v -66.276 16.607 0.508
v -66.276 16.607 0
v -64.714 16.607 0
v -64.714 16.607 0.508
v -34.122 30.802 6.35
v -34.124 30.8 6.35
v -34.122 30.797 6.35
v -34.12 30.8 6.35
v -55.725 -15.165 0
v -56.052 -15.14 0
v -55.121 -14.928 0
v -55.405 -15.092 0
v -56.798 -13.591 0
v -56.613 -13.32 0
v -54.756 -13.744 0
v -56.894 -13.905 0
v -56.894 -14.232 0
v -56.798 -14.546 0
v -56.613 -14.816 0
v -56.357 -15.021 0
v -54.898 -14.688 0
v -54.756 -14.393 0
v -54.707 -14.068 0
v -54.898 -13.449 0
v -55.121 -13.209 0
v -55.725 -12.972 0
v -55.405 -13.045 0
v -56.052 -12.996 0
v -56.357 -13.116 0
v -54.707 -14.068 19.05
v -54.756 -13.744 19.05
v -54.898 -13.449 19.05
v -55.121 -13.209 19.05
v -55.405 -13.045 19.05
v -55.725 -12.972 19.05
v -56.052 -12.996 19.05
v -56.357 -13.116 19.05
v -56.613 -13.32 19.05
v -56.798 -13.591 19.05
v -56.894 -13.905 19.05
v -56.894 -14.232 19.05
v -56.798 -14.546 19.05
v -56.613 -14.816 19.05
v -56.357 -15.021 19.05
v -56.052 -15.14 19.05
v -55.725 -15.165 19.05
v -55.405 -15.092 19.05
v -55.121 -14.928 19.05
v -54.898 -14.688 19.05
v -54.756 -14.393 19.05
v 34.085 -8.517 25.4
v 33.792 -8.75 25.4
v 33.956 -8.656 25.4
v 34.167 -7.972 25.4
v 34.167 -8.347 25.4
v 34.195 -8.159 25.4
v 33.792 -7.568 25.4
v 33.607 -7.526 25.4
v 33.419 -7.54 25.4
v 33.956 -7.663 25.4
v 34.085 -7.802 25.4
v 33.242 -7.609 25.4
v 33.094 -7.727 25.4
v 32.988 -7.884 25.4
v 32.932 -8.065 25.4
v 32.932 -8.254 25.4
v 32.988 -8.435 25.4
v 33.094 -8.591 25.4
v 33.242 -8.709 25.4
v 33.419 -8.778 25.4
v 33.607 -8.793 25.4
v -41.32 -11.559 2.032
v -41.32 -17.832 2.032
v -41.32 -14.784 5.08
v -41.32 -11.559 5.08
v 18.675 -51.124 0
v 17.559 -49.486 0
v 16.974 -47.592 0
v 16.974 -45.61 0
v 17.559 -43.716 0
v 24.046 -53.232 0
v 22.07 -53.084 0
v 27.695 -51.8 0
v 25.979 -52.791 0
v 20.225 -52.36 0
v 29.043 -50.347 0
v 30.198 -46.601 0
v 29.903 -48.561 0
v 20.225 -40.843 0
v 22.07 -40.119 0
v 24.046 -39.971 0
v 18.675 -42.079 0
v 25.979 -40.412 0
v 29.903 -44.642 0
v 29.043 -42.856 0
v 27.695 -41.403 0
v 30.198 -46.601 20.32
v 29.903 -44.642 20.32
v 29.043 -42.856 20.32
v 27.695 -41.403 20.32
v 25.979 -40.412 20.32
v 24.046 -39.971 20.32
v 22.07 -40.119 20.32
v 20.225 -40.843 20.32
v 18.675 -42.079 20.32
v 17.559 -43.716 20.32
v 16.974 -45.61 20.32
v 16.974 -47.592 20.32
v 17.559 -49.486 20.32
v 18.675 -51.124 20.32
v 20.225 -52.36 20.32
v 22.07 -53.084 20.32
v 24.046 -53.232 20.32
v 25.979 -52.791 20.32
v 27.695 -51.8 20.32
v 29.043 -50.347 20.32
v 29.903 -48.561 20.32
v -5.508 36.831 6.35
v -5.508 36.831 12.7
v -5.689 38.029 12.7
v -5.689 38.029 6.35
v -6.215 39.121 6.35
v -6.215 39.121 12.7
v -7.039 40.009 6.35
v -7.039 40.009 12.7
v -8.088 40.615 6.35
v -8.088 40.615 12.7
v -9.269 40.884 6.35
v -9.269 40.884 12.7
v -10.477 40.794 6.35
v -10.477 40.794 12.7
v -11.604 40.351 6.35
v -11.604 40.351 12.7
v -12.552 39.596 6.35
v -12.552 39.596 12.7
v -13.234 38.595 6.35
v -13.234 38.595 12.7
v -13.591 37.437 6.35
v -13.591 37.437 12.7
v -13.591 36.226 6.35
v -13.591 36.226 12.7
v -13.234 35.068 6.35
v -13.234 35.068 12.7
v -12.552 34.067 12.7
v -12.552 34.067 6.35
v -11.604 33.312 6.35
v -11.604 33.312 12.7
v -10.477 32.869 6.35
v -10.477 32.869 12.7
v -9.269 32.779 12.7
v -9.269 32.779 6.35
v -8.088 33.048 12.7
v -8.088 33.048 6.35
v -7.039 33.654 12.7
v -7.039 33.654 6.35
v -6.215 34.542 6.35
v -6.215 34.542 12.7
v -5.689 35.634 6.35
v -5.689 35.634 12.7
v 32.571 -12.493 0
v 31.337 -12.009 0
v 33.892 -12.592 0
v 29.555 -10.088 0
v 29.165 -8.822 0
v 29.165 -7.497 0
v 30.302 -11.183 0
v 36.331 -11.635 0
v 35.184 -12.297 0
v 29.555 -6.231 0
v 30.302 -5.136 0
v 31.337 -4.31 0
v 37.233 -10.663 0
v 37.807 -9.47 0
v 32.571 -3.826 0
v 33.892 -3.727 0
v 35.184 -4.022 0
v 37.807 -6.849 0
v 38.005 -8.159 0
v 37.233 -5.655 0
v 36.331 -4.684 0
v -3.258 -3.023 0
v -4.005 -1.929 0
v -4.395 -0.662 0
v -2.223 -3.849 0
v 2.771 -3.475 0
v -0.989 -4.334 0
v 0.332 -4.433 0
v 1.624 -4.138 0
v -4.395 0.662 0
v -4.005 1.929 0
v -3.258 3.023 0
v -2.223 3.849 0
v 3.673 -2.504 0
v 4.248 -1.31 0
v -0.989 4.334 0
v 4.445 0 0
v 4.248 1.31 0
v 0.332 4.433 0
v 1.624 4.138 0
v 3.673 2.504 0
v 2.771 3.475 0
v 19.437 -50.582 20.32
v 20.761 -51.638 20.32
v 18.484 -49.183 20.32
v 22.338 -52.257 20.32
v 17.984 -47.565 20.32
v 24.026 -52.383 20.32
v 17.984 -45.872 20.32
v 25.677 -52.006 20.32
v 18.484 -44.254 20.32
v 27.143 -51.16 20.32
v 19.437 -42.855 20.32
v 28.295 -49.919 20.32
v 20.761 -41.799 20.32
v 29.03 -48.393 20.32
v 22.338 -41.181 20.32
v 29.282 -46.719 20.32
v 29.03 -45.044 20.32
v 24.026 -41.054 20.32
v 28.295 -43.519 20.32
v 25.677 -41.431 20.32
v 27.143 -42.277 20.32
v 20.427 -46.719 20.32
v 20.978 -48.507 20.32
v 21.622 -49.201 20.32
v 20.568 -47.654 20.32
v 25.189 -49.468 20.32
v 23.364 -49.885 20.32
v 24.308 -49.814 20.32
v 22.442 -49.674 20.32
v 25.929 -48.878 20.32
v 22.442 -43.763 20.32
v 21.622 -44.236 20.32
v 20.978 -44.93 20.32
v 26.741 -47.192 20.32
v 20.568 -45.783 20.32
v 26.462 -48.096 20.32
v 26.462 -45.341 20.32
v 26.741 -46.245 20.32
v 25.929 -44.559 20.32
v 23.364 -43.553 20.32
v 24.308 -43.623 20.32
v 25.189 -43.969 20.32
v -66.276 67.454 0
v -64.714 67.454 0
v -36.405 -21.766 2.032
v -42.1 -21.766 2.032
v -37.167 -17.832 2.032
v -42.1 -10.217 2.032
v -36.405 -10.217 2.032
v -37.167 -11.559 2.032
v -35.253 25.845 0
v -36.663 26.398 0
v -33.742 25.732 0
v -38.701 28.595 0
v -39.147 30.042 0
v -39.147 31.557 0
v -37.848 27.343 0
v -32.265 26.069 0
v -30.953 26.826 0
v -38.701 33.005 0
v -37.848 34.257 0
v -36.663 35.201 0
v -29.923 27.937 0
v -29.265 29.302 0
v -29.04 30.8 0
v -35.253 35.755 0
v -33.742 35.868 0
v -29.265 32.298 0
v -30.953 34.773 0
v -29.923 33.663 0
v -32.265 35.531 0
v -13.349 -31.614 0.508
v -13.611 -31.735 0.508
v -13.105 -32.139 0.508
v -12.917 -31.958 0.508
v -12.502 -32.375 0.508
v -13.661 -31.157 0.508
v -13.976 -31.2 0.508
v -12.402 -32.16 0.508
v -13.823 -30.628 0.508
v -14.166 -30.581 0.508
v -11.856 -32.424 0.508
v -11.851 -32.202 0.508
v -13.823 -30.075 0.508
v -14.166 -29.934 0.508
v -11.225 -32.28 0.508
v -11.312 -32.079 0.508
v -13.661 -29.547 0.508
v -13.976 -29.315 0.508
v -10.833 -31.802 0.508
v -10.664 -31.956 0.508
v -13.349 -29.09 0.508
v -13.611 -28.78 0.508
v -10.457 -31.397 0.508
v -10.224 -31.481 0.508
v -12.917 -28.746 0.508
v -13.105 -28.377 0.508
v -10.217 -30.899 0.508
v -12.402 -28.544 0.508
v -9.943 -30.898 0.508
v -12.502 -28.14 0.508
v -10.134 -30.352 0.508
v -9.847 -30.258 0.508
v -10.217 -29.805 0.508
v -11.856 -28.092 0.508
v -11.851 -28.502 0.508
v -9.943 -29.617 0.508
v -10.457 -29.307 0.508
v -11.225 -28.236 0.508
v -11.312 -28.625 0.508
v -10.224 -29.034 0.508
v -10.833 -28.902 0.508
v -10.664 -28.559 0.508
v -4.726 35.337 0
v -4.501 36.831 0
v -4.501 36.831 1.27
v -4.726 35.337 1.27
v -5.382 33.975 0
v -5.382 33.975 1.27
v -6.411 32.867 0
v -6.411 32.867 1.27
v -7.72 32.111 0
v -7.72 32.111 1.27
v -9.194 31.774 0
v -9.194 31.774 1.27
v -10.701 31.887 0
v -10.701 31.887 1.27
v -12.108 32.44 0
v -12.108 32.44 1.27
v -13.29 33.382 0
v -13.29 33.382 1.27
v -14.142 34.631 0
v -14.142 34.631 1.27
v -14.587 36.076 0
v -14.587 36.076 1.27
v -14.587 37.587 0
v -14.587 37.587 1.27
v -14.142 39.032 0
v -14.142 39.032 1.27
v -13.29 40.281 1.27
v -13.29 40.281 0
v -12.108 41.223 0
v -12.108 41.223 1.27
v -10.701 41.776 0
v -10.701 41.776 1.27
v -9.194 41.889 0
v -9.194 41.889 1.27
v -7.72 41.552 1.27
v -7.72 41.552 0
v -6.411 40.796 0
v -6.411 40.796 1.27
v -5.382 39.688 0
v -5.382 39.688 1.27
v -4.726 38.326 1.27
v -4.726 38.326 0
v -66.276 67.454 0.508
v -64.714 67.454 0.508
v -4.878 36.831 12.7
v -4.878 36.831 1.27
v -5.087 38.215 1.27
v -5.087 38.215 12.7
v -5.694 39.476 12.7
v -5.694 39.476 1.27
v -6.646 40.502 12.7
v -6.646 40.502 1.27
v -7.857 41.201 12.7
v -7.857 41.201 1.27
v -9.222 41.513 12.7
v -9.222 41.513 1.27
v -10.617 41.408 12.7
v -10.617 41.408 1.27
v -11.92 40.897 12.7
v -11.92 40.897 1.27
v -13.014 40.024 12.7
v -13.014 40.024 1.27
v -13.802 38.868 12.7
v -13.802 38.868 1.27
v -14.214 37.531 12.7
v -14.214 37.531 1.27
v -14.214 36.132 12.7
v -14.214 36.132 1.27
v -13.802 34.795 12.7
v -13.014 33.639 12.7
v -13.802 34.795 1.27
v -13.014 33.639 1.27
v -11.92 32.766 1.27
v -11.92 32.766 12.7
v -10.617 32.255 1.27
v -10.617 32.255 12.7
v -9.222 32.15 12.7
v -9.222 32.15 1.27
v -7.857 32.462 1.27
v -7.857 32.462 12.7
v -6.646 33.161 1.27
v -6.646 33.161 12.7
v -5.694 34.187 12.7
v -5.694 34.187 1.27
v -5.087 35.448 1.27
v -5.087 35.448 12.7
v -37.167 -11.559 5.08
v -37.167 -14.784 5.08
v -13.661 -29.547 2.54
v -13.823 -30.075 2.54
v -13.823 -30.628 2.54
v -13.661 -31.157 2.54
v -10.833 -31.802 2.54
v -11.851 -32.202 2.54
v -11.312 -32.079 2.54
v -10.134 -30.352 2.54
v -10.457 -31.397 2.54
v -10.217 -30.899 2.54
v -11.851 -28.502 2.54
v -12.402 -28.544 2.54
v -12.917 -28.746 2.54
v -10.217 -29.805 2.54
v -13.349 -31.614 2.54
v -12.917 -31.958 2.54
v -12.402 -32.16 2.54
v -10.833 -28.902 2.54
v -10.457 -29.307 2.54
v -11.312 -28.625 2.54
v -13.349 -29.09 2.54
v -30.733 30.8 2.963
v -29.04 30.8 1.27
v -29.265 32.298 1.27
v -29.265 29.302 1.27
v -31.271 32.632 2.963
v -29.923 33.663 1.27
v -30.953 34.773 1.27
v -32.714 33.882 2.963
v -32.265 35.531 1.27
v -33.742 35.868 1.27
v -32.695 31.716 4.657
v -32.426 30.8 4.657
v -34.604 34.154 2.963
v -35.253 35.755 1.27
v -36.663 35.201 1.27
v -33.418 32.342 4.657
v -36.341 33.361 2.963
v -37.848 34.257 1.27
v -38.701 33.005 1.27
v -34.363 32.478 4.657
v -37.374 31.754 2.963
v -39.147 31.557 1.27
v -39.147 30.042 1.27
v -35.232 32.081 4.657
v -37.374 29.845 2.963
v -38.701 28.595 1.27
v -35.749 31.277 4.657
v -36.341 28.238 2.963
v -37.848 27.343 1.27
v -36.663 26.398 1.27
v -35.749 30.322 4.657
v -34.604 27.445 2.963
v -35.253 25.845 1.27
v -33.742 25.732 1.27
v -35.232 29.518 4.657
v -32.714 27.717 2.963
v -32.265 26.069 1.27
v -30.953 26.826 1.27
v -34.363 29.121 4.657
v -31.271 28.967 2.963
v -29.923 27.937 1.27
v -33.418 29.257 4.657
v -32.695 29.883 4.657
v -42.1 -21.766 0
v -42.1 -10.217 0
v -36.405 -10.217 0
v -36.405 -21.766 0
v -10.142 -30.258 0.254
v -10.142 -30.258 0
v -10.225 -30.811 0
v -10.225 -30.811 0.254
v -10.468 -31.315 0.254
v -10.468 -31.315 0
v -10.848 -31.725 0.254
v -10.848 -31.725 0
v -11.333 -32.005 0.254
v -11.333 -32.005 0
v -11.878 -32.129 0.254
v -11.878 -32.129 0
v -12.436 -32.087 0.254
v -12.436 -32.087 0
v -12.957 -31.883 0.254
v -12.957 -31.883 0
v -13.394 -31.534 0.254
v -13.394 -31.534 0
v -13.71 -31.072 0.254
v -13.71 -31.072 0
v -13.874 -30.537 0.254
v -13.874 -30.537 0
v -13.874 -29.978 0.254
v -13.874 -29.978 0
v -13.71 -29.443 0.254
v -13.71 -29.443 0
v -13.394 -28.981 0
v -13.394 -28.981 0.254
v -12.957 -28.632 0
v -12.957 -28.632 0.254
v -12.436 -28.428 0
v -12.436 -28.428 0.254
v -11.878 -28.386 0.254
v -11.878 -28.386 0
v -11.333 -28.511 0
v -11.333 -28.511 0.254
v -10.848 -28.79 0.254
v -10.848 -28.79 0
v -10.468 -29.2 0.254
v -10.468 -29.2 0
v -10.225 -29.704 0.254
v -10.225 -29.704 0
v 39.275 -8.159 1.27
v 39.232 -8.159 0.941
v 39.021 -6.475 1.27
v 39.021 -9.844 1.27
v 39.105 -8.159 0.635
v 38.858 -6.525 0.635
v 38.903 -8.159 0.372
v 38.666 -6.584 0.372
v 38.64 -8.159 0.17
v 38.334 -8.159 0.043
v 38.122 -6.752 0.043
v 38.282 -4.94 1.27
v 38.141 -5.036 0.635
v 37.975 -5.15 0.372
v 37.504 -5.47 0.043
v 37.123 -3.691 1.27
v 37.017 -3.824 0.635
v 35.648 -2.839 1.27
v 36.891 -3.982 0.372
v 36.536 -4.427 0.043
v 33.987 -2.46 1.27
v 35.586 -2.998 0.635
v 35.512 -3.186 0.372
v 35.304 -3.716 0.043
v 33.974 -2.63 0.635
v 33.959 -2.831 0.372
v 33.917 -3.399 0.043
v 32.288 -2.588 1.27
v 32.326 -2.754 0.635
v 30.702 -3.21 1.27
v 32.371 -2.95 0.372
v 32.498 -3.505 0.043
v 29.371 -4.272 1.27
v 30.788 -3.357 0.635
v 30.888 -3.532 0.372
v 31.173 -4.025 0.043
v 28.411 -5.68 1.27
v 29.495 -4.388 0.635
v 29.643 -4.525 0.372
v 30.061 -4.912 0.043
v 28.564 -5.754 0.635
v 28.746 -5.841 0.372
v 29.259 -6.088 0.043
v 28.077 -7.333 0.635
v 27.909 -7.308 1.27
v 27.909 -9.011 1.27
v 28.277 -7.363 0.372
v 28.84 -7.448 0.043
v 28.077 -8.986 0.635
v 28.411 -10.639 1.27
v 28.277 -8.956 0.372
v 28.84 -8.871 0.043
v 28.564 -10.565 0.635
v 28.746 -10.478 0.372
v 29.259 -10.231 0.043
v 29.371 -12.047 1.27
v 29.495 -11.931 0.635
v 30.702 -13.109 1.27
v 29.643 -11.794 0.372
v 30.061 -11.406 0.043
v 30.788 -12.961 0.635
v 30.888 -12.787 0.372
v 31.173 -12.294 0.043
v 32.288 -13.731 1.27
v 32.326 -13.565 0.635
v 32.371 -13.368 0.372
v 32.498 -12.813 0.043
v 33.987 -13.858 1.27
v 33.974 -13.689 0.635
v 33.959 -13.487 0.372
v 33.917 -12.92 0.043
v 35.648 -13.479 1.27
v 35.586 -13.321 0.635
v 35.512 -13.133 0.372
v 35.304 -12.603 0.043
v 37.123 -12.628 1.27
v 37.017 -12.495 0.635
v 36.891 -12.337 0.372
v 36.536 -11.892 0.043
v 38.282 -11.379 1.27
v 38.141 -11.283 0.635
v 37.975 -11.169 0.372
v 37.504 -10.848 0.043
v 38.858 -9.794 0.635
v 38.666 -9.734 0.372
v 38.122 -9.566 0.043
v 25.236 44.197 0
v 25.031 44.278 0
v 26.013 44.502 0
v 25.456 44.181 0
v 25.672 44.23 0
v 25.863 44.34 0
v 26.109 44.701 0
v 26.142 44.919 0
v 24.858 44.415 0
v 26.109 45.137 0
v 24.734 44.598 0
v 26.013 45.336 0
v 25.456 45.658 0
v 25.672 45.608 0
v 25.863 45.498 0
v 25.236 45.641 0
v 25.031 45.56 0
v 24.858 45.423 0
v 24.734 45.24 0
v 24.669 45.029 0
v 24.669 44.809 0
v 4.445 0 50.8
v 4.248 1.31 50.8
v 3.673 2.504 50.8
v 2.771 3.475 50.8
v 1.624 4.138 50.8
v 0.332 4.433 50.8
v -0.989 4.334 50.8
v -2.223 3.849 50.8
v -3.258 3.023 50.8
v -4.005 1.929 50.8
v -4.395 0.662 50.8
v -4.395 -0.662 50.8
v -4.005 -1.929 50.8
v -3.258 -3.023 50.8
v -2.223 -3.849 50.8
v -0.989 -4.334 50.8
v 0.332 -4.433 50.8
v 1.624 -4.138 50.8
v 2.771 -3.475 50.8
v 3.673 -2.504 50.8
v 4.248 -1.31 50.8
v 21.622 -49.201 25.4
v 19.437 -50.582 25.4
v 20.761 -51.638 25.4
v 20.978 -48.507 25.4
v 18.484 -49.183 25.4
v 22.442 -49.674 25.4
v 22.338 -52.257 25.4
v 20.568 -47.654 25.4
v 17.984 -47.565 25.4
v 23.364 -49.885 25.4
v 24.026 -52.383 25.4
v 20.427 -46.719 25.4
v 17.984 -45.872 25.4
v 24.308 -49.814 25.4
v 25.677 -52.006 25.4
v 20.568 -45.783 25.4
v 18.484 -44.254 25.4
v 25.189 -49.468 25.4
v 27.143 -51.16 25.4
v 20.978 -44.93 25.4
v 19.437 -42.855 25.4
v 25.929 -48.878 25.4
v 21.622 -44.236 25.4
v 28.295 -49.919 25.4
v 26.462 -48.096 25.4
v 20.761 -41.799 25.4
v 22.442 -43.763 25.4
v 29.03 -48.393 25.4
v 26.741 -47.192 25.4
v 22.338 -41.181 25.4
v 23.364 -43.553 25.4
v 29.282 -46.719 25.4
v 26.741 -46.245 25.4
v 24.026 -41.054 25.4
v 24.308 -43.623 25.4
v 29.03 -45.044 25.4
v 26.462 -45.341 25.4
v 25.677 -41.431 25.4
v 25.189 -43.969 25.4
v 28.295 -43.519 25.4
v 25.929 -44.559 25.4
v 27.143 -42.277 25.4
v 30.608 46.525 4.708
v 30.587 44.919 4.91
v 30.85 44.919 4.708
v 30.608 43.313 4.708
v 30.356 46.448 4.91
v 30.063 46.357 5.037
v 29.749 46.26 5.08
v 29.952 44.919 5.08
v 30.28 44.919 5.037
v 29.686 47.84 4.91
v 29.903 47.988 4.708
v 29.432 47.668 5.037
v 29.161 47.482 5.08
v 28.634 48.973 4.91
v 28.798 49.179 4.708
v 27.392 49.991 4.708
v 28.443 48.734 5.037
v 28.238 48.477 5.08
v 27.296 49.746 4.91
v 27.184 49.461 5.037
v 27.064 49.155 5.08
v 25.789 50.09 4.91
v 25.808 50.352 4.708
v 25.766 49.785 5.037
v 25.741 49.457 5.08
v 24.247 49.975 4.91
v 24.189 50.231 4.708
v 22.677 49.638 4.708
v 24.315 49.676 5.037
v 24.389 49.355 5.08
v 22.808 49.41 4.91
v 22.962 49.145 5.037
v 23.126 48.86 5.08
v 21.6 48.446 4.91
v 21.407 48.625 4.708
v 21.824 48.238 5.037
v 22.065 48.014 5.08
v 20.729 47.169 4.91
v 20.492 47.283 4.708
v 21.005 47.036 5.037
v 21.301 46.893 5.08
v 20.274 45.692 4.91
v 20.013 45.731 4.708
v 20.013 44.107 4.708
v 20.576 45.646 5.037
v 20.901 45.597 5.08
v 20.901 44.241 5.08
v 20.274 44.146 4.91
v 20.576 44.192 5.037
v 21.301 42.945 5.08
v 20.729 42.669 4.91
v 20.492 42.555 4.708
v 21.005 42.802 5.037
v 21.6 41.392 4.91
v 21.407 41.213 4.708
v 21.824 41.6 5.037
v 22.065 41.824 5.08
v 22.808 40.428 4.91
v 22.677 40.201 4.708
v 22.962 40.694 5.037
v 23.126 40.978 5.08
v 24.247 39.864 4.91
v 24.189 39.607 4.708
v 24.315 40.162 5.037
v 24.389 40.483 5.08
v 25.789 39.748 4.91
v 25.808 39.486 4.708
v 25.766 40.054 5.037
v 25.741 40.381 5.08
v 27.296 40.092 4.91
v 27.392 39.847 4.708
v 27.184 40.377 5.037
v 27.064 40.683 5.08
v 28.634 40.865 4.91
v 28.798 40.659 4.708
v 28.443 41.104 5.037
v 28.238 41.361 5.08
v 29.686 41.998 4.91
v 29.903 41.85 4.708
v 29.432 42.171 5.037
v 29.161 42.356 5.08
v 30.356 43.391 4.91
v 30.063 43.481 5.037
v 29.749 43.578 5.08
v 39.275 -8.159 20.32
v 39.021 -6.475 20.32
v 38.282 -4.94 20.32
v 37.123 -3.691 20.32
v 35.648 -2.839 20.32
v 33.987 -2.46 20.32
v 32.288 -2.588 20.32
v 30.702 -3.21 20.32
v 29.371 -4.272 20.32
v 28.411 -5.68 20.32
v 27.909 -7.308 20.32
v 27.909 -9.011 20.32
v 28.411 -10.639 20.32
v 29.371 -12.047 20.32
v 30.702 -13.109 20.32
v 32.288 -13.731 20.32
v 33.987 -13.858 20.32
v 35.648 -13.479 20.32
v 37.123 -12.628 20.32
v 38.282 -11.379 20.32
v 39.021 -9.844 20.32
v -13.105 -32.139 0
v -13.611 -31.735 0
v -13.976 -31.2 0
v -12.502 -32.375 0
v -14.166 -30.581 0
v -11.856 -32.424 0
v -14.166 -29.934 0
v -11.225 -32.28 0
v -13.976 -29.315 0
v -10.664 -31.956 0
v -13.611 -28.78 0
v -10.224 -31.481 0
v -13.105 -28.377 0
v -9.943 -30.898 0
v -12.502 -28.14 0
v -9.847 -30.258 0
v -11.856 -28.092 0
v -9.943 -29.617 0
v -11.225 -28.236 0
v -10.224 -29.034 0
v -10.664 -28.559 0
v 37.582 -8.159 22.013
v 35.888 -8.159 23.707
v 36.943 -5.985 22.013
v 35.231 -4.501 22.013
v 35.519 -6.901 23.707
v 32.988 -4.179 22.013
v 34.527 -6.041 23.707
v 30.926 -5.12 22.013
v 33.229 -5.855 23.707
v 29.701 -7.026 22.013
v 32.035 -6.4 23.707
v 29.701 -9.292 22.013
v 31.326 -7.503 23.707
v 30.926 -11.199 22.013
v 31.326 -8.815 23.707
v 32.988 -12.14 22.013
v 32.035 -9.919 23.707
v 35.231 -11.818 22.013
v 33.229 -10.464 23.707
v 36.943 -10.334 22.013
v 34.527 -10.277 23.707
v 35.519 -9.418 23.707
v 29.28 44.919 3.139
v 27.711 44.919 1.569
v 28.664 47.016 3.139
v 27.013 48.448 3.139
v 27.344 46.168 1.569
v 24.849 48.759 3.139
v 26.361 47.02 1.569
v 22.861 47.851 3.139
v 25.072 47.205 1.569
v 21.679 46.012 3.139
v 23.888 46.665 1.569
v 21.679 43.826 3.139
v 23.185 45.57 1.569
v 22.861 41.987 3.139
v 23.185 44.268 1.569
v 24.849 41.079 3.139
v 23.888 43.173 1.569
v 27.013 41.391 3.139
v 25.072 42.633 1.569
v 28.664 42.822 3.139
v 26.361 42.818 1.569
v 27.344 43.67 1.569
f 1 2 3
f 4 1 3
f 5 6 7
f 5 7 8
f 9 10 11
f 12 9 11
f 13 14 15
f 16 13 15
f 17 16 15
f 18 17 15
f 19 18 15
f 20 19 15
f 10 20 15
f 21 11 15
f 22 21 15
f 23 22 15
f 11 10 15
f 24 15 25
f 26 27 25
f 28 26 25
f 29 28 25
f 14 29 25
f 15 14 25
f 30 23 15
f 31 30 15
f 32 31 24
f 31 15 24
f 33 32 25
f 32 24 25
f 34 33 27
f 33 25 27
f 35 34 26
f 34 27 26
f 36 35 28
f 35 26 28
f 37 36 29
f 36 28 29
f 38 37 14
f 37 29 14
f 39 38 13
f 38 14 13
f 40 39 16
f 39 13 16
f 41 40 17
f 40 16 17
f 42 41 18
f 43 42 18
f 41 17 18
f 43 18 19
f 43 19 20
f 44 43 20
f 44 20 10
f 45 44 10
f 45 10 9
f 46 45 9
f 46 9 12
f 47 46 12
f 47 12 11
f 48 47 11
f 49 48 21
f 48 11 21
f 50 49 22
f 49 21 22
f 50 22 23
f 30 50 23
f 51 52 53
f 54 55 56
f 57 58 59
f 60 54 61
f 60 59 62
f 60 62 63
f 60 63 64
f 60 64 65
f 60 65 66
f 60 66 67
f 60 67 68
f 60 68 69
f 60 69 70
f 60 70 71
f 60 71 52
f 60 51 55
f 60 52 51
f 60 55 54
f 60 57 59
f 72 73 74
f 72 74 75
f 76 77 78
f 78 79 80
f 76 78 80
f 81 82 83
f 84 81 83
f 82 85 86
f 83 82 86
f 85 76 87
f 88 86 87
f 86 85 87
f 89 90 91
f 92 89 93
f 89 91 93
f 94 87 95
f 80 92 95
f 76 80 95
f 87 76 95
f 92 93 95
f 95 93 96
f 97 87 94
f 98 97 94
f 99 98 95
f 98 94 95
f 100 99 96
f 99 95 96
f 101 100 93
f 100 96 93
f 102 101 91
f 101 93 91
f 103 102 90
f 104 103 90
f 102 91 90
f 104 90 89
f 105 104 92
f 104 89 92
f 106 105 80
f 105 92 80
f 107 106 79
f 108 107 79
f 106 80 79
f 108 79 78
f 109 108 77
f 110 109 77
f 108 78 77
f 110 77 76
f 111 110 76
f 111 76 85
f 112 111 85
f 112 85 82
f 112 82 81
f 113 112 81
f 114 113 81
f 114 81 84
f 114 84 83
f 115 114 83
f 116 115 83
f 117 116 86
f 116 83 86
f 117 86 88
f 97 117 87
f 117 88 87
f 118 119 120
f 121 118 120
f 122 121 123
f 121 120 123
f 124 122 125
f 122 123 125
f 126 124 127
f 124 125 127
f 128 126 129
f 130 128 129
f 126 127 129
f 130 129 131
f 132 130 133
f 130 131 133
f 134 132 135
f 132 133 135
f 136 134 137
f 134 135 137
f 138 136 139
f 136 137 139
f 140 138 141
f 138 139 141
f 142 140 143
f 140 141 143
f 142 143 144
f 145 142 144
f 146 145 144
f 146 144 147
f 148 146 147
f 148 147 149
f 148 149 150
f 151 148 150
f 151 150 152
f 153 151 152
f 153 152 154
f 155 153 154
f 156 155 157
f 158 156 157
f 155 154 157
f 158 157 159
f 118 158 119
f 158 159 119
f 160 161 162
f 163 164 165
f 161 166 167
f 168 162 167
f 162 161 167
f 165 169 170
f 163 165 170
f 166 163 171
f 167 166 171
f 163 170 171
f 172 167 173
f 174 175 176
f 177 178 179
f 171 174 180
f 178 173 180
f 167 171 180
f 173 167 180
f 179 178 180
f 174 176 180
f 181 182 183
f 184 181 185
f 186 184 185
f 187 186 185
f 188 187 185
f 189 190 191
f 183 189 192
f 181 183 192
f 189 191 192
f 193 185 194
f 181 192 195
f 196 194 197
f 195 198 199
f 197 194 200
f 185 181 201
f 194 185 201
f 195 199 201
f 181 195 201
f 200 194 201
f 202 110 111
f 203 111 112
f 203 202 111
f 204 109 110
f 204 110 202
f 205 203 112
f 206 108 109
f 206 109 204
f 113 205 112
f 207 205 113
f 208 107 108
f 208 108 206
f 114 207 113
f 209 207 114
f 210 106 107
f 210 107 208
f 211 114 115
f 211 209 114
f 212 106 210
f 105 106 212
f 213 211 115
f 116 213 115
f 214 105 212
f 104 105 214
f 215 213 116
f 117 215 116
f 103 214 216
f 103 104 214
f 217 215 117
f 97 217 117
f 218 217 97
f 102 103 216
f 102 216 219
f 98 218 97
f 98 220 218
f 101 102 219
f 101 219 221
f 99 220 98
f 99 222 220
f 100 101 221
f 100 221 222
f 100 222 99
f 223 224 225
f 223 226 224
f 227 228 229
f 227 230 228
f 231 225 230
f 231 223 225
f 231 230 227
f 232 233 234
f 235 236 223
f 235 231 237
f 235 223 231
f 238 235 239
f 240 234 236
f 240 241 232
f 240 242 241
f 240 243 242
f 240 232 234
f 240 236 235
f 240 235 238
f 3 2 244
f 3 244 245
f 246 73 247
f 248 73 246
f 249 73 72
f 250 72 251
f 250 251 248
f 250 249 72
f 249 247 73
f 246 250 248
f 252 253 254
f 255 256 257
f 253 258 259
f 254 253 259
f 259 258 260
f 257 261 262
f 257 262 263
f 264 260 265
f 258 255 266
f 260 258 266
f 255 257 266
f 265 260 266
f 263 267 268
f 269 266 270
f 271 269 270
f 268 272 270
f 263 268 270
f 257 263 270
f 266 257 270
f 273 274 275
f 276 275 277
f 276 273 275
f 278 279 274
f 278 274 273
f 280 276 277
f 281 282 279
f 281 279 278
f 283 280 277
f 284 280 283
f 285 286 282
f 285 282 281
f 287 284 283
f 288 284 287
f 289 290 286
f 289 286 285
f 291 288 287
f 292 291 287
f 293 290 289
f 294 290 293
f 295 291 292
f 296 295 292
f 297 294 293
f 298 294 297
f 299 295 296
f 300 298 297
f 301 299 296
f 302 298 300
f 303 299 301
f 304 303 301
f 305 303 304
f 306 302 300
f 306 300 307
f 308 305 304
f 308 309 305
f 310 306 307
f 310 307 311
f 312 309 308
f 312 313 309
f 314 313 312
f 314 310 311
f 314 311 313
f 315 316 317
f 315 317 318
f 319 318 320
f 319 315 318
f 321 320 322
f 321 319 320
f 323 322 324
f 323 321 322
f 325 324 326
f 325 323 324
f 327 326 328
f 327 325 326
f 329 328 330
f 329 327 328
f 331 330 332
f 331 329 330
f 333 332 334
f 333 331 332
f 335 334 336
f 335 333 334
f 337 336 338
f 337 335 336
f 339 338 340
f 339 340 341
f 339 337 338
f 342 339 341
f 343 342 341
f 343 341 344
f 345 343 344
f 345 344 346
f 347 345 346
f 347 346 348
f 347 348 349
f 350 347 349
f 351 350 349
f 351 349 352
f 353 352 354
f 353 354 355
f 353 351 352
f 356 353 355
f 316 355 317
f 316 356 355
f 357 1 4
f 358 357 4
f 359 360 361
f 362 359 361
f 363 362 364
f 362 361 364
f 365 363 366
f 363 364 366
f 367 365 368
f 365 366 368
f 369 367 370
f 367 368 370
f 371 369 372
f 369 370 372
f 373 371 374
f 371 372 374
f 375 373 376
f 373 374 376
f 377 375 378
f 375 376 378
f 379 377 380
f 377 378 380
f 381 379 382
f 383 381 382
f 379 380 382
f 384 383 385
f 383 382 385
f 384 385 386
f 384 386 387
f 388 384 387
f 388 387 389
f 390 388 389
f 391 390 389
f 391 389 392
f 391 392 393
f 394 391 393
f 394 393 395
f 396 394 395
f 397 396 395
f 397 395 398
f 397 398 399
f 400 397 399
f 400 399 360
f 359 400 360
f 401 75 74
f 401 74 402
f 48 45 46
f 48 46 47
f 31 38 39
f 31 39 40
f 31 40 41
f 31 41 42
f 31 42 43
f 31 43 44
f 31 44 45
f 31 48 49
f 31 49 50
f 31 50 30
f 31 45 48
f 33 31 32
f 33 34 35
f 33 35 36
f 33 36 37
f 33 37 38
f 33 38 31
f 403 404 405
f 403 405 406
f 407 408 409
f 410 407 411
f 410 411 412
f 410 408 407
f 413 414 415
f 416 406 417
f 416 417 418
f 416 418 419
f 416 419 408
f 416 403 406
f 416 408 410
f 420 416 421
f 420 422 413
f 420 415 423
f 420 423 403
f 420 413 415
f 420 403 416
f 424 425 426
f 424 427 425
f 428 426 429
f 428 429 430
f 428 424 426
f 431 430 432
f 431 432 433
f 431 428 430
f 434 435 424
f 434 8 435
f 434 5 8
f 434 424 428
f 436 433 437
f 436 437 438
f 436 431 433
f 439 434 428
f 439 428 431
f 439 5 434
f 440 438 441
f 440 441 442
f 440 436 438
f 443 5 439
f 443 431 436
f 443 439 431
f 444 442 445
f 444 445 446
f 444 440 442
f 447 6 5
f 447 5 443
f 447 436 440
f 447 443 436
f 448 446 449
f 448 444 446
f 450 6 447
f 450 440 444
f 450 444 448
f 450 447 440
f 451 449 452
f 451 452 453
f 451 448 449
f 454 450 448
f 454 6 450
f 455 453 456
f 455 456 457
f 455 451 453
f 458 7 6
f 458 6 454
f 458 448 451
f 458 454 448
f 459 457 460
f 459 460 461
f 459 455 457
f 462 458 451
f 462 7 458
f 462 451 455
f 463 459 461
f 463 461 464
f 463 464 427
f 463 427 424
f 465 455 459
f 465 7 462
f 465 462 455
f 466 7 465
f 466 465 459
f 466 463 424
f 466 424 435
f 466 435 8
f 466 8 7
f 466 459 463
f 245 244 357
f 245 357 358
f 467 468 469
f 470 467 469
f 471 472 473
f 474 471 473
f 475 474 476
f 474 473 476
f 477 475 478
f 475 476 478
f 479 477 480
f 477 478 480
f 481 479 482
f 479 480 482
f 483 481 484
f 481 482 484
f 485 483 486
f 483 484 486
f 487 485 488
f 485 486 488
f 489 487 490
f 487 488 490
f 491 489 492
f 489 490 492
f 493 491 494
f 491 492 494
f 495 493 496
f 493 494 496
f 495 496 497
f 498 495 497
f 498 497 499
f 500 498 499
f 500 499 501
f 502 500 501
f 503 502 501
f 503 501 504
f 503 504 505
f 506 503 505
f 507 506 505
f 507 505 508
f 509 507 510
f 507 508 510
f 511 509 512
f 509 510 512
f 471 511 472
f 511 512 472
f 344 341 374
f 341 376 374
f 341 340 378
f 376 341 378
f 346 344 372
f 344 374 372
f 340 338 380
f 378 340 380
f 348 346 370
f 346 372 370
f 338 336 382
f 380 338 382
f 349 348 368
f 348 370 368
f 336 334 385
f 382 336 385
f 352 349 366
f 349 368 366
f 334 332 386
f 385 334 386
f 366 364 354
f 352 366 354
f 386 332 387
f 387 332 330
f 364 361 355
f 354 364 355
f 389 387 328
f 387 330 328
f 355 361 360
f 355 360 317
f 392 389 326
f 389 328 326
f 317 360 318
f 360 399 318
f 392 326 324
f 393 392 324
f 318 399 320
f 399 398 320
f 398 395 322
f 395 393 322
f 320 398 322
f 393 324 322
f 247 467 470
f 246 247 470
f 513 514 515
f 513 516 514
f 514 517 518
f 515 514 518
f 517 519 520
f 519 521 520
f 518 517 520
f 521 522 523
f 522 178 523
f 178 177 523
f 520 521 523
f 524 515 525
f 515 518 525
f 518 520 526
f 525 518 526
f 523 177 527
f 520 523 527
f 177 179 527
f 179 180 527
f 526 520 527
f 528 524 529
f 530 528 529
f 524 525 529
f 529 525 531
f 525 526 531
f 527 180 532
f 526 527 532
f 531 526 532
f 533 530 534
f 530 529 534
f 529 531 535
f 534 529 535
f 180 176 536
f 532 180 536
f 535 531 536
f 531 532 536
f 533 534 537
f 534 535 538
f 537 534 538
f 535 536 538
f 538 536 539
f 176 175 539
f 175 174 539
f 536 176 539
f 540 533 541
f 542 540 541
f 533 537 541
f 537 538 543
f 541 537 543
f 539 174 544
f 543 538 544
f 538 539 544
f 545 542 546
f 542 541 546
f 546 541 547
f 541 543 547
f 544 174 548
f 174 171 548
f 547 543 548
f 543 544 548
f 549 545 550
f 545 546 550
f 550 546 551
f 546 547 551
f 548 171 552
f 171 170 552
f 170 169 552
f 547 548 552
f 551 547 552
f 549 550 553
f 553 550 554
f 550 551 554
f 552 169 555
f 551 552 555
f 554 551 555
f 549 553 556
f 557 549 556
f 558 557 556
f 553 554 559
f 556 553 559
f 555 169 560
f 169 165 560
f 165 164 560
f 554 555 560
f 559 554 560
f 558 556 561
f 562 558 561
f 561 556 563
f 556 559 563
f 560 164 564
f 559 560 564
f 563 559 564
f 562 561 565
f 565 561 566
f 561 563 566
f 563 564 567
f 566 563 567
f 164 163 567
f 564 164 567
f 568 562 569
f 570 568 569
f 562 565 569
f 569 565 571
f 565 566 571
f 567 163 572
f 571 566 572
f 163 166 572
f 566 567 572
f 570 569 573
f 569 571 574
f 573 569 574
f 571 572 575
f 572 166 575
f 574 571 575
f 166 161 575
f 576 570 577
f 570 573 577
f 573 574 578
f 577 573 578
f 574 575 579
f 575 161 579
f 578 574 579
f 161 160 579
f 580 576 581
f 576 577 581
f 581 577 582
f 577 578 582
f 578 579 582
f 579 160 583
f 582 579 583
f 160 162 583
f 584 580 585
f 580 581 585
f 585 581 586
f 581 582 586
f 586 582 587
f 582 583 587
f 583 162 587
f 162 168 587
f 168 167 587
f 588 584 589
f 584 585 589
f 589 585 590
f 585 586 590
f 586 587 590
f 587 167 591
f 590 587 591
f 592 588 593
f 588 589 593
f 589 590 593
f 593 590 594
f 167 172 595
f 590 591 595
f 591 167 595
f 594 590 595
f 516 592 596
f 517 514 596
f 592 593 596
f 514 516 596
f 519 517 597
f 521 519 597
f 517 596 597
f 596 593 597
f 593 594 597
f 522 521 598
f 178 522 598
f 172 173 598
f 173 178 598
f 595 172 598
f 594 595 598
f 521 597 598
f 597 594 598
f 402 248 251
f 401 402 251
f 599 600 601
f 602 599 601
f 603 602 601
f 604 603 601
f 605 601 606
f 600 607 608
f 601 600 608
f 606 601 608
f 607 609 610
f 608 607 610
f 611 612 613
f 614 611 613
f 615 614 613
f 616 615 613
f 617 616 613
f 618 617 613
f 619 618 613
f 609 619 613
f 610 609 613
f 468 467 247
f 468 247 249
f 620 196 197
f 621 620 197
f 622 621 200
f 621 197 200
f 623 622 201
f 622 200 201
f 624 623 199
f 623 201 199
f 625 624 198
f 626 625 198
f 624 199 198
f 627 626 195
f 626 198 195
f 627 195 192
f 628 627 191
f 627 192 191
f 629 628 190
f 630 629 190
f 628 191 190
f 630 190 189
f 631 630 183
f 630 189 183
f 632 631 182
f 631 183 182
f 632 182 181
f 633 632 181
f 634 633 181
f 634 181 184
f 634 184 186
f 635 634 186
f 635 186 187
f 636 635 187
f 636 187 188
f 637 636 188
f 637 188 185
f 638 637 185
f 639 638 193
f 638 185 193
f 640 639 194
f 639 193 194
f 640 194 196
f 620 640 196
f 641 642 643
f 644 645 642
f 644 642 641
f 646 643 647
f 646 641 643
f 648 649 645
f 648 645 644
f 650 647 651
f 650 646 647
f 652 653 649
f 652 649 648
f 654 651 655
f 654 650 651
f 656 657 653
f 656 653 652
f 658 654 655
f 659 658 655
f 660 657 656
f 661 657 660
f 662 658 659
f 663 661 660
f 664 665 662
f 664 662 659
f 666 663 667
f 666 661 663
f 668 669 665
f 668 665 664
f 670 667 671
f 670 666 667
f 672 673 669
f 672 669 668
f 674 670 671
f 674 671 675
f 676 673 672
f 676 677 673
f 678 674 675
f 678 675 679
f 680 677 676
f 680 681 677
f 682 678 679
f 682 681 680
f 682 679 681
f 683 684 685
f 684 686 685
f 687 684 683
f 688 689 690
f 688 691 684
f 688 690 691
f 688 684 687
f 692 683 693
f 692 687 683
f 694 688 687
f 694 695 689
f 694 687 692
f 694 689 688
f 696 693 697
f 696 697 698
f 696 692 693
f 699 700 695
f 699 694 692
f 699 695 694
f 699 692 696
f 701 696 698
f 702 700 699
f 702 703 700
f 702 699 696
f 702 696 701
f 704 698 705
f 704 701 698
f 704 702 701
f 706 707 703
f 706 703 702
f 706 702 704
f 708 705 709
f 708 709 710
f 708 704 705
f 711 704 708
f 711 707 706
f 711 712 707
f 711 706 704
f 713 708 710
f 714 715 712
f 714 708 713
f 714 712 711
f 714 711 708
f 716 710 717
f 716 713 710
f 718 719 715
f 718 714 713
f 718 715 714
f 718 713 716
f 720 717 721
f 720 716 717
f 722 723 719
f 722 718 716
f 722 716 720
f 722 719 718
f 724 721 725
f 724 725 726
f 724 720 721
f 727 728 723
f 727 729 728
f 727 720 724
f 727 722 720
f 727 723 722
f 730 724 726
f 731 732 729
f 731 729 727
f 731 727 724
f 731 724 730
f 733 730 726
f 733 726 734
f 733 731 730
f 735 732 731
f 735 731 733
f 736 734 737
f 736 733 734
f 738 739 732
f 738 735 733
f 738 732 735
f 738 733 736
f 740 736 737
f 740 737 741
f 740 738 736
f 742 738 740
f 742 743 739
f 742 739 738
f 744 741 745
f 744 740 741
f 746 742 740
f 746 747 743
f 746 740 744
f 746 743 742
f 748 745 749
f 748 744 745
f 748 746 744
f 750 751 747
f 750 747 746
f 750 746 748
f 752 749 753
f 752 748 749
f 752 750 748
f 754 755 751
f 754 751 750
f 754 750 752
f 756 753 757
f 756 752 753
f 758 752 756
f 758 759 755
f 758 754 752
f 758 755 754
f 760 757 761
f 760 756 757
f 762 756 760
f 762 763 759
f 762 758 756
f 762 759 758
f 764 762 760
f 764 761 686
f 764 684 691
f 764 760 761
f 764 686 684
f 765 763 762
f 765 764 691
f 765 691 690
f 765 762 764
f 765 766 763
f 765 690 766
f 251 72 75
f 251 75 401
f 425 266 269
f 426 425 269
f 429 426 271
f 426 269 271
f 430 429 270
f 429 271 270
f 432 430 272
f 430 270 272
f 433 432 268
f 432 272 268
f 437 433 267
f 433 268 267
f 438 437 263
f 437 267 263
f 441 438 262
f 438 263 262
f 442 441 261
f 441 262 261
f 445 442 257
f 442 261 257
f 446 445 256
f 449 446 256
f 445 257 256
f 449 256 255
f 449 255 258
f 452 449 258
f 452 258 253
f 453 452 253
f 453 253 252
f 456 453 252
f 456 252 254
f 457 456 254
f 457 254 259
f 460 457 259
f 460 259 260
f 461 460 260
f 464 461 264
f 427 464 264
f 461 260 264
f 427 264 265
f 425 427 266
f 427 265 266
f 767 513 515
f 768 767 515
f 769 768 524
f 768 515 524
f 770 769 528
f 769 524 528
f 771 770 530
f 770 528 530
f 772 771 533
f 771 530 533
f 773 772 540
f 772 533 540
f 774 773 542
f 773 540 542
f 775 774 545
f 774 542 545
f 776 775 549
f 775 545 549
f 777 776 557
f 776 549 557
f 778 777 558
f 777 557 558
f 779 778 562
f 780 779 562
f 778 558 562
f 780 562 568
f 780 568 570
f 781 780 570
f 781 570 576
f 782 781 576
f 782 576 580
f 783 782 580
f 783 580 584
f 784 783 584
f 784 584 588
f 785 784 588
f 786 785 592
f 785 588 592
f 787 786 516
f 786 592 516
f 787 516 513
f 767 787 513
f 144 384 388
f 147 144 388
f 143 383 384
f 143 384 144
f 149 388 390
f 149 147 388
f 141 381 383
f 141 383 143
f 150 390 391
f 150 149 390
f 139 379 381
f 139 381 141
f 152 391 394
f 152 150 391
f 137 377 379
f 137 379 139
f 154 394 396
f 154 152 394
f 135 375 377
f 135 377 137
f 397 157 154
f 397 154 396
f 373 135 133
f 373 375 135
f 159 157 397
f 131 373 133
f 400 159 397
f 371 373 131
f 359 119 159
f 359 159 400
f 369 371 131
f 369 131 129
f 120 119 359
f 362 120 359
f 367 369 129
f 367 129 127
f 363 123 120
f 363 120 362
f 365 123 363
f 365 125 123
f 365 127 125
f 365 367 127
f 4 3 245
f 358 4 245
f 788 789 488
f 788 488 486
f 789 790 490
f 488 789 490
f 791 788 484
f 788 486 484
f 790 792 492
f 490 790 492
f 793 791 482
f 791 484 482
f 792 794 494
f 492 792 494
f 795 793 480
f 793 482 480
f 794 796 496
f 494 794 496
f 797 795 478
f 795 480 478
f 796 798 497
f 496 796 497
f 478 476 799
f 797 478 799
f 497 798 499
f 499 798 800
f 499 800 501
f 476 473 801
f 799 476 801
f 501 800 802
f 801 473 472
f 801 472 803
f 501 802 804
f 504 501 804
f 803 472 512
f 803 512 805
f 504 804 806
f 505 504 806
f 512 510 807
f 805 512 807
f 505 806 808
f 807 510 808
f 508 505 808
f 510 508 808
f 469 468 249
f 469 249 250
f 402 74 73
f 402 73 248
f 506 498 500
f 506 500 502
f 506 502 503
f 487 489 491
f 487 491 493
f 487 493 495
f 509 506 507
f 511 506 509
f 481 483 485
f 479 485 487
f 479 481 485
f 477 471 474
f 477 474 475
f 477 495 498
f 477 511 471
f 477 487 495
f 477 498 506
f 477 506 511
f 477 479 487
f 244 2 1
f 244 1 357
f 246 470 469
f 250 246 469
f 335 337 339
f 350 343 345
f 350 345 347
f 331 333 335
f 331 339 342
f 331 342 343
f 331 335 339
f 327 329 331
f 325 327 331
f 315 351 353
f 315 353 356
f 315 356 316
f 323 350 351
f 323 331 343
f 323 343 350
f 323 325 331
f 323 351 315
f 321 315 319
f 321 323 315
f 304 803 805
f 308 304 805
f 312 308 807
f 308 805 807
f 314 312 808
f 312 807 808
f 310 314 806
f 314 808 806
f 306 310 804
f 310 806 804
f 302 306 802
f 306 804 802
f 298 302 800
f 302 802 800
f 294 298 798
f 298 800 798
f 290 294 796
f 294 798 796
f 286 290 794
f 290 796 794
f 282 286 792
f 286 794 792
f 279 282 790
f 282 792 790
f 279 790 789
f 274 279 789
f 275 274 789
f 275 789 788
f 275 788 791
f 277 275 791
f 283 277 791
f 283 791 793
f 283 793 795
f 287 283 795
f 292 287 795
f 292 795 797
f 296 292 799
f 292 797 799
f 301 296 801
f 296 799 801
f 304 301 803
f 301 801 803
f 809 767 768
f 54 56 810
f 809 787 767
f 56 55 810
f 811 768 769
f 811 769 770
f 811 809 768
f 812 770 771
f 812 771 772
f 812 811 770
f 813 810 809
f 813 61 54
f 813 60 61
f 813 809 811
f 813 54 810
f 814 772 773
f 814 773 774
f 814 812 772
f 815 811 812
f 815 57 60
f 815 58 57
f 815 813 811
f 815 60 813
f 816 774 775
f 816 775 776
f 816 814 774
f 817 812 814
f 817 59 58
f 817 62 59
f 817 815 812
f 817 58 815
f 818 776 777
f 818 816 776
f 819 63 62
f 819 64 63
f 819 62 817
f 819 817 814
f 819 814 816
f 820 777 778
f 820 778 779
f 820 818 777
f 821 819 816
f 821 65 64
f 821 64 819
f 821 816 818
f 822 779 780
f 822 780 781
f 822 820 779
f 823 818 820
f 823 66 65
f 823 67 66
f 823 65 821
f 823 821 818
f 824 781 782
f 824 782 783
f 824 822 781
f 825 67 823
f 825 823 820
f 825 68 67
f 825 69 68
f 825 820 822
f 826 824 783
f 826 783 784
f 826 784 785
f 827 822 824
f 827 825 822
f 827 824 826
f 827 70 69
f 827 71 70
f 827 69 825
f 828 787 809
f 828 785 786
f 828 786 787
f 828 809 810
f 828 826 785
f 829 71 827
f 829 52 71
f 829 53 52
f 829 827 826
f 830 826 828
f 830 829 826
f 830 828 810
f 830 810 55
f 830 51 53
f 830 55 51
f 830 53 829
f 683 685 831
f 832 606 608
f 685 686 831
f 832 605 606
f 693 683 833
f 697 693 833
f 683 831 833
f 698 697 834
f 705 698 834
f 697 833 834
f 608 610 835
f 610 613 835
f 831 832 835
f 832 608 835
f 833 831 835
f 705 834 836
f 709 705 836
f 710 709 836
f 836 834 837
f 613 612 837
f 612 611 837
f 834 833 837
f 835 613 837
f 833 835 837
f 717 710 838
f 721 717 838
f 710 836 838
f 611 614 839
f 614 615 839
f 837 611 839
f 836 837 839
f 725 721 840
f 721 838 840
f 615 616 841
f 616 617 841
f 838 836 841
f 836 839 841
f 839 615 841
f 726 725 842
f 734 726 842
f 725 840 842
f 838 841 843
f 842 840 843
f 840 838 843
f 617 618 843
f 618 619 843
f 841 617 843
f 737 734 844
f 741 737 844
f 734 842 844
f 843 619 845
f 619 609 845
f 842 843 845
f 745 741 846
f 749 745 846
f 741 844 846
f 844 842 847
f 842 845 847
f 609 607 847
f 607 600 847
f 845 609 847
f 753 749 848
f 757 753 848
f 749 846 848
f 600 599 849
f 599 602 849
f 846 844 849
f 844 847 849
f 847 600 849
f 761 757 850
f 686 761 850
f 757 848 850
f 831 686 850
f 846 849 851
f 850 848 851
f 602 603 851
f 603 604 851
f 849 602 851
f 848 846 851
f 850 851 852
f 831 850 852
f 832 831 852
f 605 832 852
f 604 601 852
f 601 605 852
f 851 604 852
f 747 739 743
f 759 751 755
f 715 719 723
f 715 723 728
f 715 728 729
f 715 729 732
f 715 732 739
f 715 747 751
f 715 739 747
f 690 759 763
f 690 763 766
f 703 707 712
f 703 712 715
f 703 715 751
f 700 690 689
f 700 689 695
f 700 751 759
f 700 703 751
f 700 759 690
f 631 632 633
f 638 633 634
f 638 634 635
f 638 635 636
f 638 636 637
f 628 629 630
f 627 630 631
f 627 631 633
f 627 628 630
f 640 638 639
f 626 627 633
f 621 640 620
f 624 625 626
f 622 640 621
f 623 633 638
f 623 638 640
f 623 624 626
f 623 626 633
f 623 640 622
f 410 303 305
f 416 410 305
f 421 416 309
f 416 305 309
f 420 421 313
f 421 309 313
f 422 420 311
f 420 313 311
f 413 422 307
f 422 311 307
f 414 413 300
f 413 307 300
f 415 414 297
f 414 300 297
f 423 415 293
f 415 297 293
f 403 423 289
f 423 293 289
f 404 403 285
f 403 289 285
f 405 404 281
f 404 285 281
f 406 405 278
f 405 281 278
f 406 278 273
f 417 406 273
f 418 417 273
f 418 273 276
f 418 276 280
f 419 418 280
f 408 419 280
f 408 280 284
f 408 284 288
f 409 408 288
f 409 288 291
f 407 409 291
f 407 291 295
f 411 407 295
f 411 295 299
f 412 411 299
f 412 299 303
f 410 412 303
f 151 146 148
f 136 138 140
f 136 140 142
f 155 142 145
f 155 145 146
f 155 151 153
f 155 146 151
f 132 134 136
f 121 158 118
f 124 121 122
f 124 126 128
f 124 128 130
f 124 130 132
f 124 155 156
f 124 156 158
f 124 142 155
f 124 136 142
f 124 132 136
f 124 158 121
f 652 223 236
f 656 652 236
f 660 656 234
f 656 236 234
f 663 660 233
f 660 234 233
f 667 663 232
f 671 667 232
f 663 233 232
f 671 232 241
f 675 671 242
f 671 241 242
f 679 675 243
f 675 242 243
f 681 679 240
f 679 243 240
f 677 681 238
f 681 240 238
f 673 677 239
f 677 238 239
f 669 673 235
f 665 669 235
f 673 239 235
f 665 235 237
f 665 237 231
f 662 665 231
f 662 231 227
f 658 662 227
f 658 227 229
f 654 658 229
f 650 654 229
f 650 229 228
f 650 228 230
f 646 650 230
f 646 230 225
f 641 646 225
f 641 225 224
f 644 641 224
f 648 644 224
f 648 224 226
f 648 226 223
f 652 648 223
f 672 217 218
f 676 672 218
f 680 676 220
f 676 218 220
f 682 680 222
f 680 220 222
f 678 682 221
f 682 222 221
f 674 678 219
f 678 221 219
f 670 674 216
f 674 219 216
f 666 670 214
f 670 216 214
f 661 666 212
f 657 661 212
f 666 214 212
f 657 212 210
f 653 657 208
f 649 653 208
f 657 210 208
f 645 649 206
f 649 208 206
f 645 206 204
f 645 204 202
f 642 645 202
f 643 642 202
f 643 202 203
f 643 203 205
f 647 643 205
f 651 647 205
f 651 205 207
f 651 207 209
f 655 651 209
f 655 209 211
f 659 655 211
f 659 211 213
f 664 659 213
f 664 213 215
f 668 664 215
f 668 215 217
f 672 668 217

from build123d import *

# Parameters (mm, degrees)
F0_R      = 4.445
F1_DEPTH  = 50.8
F2_R      = 5.8204650715
F3_DEPTH  = 5.08
F4_R      = 1.27
F5_R      = 5.715
F6_DEPTH  = 25.4
F7_R      = 1.27
F8_SIZE   = 5.08
F10_R     = 4.6942850123
F11_DEPTH = 12.7
F12_R     = 4.064
F13_DEPTH = 6.35
F14_R     = 5.0713728951
F15_DEPTH = 1.27
F16_R     = 5.0823136585
F17_DEPTH = 6.35
F18_SIZE  = 5.08
F19_R     = 1.0996327095
F20_DEPTH = 19.05
F21_W     = 4.1527673602
F21_H     = 8.3055365831
F22_DEPTH = 5.08
F23_SIZE  = 5.07999
F24_W     = 5.6952238083
F24_H     = 11.5486495197
F25_DEPTH = 2.032
F26_W     = 1.5624314547
F26_H     = 50.8466977626
F27_DEPTH = 0.508
F28_R     = 5.6805138748
F29_DEPTH = 25.4
F31_D     = 6.35
F32_R     = 6.6491964472
F33_DEPTH = 20.32
F34_R     = 1.854860509
F35_DEPTH = 2.54
F36_R     = 2.1720678398
F37_DEPTH = 0.508
F38_R     = 1.8768217279
F39_DEPTH = 0.254


# Not quite as in the source:
# - a fillet or chamfer that OpenCascade refuses, or shapes differently, is made with other operations: its cross-section is extruded or revolved along the edge and cut away or added
# - a fillet or chamfer is up to 0.001 mm smaller than in the source, because OpenCascade refuses the exact size


with BuildPart() as f1:
    # F0 (on Top) → F1 (new body)
    with BuildSketch(Plane.XY):
        Circle(F0_R)
    extrude(amount=F1_DEPTH)


with BuildPart() as f3:
    # F2 (on Top) → F3 (new body)
    with BuildSketch(Plane.XY):
        with Locations((25.401096791, 44.9191108346)):
            Circle(F2_R)
    extrude(amount=F3_DEPTH)

    # F4
    f4_edges = [f3.edges().sort_by_distance(p)[0] for p in [
        (19.580632, 44.919111, 5.08),
    ]]
    fillet(f4_edges, radius=F4_R)

    # F9: chamfer of 5.08 on 3 edges, made by hand

    # F9_s1 → F9_t2 (revolve, cut)
    with BuildSketch(Plane.XZ.offset(-44.9191108346)):
        Polygon((31.2215618626, 5.08), (26.1415618626, 0), (31.2215618626, 0), align=None)
    revolve(axis=Axis((25.401096791, 44.9191108346, 0), (0, 0, 1)), mode=Mode.SUBTRACT)


with BuildPart() as f6:
    # F5 (on Top) → F6 (new body)
    with BuildSketch(Plane.XY):
        with Locations((33.5599295795, -8.1593608484)):
            Circle(F5_R)
    extrude(amount=F6_DEPTH)

    # F7
    f7_edges = [f6.edges().sort_by_distance(p)[0] for p in [
        (27.84493, -8.159361, 0),
    ]]
    fillet(f7_edges, radius=F7_R)

    # F8
    f8_edges = [f6.edges().sort_by_distance(p)[0] for p in [
        (29.11493, -8.159361, 0),
        (39.27493, -8.159361, 13.335),
        (27.84493, -8.159361, 1.27),
        (27.84493, -8.159361, 25.4),
    ]]
    chamfer(f8_edges, length=F8_SIZE)


with BuildPart() as f11:
    # F10 (on Top) → F11 (new body)
    with BuildSketch(Plane.XY):
        with Locations((-9.5724938437, 36.8314981461)):
            Circle(F10_R)
    extrude(amount=F11_DEPTH)

    # F12 (on face) → F13 (cut)
    with BuildSketch(Plane.XY.offset(12.7)):
        with Locations((-9.5724938437, 36.8314981461)):
            Circle(F12_R)
    extrude(amount=-F13_DEPTH, mode=Mode.SUBTRACT)

    # F14 (on face) → F15 (join)
    with BuildSketch(Plane(origin=(0, 0, 0), x_dir=(1, 0, 0), z_dir=(0, 0, -1))):
        with Locations((-9.5724938437, -36.8314981461)):
            Circle(F14_R)
    extrude(amount=-F15_DEPTH)


with BuildPart() as f17:
    # F16 (on Top) → F17 (new body)
    with BuildSketch(Plane.XY):
        with Locations((-34.1219119728, 30.7996980846)):
            Circle(F16_R)
    extrude(amount=F17_DEPTH)

    # F18
    f18_edges = [f17.edges().sort_by_distance(p)[0] for p in [
        (-39.204226, 30.799698, 6.35),
    ]]
    chamfer(f18_edges, length=F18_SIZE)


with BuildPart() as f20:
    # F19 (on Top) → F20 (new body)
    with BuildSketch(Plane.XY):
        with Locations((-55.8069758117, -14.0684247017)):
            Circle(F19_R)
    extrude(amount=F20_DEPTH)


with BuildPart() as f22:
    # F21 (on Top) → F22 (new body)
    with BuildSketch(Plane.XY):
        with Locations((-39.2436608672, -15.7113065943)):
            Rectangle(F21_W, F21_H)
    extrude(amount=F22_DEPTH)

    # F23 (size 5.08 in the source; OpenCascade refuses exactly that, so slightly less here)
    f23_edges = [f22.edges().sort_by_distance(p)[0] for p in [
        (-39.243661, -19.864075, 5.08),
    ]]
    chamfer(f23_edges, length=F23_SIZE)

    # F24 (on Top) → F25 (join)
    with BuildSketch(Plane.XY):
        with Locations((-39.2524786294, -15.9913040698)):
            Rectangle(F24_W, F24_H)
    extrude(amount=F25_DEPTH)


with BuildPart() as f27:
    # F26 (on Top) → F27 (new body)
    with BuildSketch(Plane.XY):
        with Locations((-65.4950290918, 42.0305496082)):
            Rectangle(F26_W, F26_H)
    extrude(amount=F27_DEPTH)


with BuildPart() as f29:
    # F28 (on Top) → F29 (new body)
    with BuildSketch(Plane.XY):
        with Locations((23.60156551, -46.7186421156)):
            Circle(F28_R)
    extrude(amount=F29_DEPTH)

    # F31 (through all)
    with Locations(Plane.XY.offset(25.4)):
        with Locations((23.60156551, -46.7186421156)):
            Hole(F31_D / 2)

    # F32 (on Top) → F33 (join)
    with BuildSketch(Plane.XY):
        with Locations((23.5493015498, -46.6014072299)):
            Circle(F32_R)
    extrude(amount=F33_DEPTH)


with BuildPart() as f35:
    # F34 (on Top) → F35 (new body)
    with BuildSketch(Plane.XY):
        with Locations((-11.9893560186, -30.3519330919)):
            Circle(F34_R)
    extrude(amount=F35_DEPTH)

    # F36 (on Top) → F37 (join)
    with BuildSketch(Plane.XY):
        with Locations((-12.018638663, -30.2576180547)):
            Circle(F36_R)
    extrude(amount=F37_DEPTH)

    # F38 (on face) → F39 (cut)
    with BuildSketch(Plane(origin=(0, 0, 0), x_dir=(1, 0, 0), z_dir=(0, 0, -1))):
        with Locations((-12.018638663, 30.2576180547)):
            Circle(F38_R)
    extrude(amount=-F39_DEPTH, mode=Mode.SUBTRACT)


solid = Compound([f1.part, f3.part, f6.part, f11.part, f17.part, f20.part, f22.part, f27.part, f29.part, f35.part])
